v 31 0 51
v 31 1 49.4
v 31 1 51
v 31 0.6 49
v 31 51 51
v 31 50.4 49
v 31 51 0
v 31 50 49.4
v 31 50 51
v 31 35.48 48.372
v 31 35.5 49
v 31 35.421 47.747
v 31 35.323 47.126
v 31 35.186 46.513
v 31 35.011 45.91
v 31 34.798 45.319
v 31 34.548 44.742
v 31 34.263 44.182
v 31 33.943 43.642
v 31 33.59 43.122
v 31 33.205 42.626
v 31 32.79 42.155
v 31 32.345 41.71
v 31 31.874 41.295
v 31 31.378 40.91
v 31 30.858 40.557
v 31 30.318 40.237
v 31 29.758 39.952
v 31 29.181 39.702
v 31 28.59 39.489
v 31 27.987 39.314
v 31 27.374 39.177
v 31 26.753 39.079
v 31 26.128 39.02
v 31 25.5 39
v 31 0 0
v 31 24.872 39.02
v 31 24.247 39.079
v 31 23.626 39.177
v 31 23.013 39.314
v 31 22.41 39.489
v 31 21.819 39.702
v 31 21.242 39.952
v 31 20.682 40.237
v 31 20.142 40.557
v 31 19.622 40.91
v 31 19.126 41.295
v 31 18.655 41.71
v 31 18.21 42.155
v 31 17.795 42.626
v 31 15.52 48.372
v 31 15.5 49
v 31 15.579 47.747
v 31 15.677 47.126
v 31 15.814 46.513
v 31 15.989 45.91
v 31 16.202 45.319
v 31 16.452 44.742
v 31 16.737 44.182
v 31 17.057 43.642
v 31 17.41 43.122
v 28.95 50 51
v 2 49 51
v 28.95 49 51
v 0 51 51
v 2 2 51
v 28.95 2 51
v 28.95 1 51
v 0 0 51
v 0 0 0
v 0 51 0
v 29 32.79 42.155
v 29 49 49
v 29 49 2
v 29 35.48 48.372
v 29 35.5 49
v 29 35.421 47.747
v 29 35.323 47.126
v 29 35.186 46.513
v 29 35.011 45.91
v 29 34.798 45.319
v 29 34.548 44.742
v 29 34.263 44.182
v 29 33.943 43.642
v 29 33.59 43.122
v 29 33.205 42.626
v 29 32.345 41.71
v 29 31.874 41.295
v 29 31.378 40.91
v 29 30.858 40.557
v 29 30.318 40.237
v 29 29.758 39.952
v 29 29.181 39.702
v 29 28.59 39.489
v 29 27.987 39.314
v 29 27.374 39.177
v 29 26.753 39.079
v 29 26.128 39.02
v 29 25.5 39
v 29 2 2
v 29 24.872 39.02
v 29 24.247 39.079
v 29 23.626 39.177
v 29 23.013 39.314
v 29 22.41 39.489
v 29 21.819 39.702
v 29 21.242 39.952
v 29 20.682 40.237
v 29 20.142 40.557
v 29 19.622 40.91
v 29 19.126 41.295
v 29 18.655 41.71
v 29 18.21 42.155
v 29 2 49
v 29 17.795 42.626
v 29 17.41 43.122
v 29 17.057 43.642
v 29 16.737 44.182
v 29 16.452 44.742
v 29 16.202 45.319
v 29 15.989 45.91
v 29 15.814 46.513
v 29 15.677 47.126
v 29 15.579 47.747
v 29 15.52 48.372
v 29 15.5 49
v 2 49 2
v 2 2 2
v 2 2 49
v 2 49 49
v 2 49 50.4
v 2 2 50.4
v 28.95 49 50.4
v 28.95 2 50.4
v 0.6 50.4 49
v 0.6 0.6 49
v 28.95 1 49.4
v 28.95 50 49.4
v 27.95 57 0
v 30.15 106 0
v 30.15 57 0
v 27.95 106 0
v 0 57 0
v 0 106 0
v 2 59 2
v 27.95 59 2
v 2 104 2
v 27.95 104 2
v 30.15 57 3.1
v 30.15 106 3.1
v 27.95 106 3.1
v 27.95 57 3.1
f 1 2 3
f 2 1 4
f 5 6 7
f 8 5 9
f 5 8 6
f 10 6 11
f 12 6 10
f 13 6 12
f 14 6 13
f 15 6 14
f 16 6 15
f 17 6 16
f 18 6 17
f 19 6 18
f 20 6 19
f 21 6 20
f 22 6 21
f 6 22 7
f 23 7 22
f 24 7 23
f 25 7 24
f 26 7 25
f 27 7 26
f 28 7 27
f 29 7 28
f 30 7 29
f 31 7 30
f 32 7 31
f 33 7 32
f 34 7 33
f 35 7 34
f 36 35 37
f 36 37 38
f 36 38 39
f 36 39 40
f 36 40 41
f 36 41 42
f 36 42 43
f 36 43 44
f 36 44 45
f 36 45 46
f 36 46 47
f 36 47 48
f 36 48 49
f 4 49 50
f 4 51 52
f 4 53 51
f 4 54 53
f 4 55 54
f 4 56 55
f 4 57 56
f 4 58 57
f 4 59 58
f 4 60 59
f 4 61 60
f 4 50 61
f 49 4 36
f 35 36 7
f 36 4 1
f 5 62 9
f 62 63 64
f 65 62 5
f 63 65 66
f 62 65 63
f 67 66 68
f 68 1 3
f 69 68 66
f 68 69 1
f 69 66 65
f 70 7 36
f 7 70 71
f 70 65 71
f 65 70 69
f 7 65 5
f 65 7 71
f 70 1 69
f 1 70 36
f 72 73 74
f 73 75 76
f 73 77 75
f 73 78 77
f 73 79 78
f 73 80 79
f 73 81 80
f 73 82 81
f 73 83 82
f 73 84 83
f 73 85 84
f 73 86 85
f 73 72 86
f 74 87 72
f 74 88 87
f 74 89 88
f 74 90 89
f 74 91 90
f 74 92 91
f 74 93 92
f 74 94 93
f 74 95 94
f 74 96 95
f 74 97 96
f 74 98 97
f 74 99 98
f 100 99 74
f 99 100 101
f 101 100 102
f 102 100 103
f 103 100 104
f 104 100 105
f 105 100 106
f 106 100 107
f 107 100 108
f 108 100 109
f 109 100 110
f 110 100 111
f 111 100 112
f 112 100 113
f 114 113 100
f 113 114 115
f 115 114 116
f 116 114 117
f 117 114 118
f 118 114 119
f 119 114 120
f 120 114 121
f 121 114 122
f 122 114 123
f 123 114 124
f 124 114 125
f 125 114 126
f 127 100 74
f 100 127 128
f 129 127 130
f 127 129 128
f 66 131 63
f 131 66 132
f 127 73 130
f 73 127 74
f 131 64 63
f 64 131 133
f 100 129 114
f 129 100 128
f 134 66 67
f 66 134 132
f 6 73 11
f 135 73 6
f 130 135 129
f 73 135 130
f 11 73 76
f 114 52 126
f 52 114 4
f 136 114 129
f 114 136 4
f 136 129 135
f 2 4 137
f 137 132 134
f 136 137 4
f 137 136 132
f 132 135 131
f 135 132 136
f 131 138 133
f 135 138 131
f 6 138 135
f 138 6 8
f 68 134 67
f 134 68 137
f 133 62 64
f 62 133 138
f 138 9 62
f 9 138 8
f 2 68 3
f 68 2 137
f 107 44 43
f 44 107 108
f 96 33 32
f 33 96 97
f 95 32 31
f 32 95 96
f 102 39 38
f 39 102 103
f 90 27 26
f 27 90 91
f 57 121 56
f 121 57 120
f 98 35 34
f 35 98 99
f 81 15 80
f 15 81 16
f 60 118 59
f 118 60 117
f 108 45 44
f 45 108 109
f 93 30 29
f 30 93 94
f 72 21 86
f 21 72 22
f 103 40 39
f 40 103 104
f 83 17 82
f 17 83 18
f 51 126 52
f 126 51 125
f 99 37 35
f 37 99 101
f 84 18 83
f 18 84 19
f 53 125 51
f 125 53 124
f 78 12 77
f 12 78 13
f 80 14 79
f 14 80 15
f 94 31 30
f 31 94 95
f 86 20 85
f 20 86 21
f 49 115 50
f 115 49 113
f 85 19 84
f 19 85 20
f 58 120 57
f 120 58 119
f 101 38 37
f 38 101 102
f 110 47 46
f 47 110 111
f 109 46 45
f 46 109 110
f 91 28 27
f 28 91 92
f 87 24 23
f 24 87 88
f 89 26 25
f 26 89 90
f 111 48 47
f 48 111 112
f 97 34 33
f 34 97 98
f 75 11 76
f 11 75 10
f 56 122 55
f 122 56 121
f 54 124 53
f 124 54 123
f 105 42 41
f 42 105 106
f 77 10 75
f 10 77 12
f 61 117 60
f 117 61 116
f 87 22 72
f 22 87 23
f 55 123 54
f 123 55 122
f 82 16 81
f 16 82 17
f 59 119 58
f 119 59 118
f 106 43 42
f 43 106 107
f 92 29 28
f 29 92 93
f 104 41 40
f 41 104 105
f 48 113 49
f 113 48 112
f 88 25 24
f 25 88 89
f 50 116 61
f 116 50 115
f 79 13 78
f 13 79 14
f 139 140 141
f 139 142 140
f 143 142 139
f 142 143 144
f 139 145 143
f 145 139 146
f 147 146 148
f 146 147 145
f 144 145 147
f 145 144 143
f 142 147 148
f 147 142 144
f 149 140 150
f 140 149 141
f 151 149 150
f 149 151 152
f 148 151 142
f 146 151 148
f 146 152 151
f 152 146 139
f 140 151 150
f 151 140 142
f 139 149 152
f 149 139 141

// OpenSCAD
// file: carcassonne_box.scad
/**
 * @file carcassonne_box.scad
 * @author Conlan Wesson (modified by [Your Name])
 * Template for Carcassonne boxes.
 * @copyright Creative Commons Attribution-NonCommercial-ShareAlike 4.0
 */

mm = 1;
cm = 10*mm;

tiles = 2*mm;
clearance = 3*mm;

width = 47*mm;
thick = 2.5*mm;
wall = 2*mm;

/**
 * Lid for box.
 * @param sections Array of section lengths.
 * @param columns Number of columns.
 * @param icon Path to icon DXF file.
 * @param rot Icon rotation in degrees.
 * @param mult Icon scale.
 * @param xoff X-offset of icon from center.
 * @param yoff Y-offset of icon from center.
 */
module carcassonne_lid(sections, columns=1, icon=false, icon2=false, icon3=false, rot=0, mult=1, xoff=0, yoff=0, mult2=1, xoff2=0, yoff2=0, mult3=1, xoff3=0, yoff3=0, g=0){
    divider_thickness = wall/2;
    length = sum(sections) + (divider_thickness * (len(sections) - 1));
    w = length+(1.5*wall)+.1;
    l = (width*columns)+wall;
    h = wall;
    d = 2;

    CubePoints = [
        [ 0-g, 0-g,   0 ],  //0
        [ w+g, 0-g,   0 ],  //1
        [ w+g, l+g,   0 ],  //2
        [ 0-g, l+g,   0 ],  //3
        [   d,   d, h+g ],  //4
        [   w,   d, h+g ],  //5
        [   w, l-d, h+g ],  //6
        [   d, l-d, h+g ]   //7
    ];

    CubeFaces = [
        [0,1,2,3],  // bottom
        [4,5,1,0],  // front
        [7,6,5,4],  // top
        [5,6,2,1],  // right
        [6,7,3,2],  // back
        [7,4,0,3]   // left
    ];

    difference(){
        union(){
            polyhedron( CubePoints, CubeFaces );
            translate([w-wall-.15,0,0]) cube([wall+.2,l, (1.5*wall)+.1]);
        }
        if(icon){
            translate([w/2+xoff,l/3+yoff,h-(wall/2)]){
                linear_extrude(height=(wall)+.1){
                    rotate(rot) scale(mult) import(icon);
                }
            }
        }
        if(icon2){
            translate([w/2+xoff2,l/3+yoff2,h-(wall/2)]){
                linear_extrude(height=(wall)+.1){
                    rotate(rot) scale(mult2) import(icon2);
                }
            }
        }
        if(icon3){
            translate([w/2+xoff3,l/3+yoff3,h-(wall/2)]){
                linear_extrude(height=(wall)+.1){
                    rotate(rot) scale(mult3) import(icon3);
                }
            }
        }
    }
}

/**
 * Carcassonne card box.
 * @param sections Array of section lengths.
 * @param columns Number of columns.
 */
module carcassonne_box(sections, columns=1){
    divider_thickness = wall/2;
    raw_length = sum(sections) + (divider_thickness * (len(sections) - 1));
    length = raw_length;

    section_count = len(sections);

    difference(){
        union(){
            difference(){
                // Outer walls
                cube([length+(2*wall), (width*columns)+(2*wall), width+(2*wall)]);
                // Cavity
                translate([wall, wall, wall]){
                    cube([length, width*columns, (width+wall)+.1]);
                }
            }
            // Dividers
            for(col = [0:columns-1]){
                divider_positions = [for(i=0; i<len(sections)-1; i=i+1) 
                    sum([for(j=[0:i]) sections[j]]) + (i * divider_thickness)];
                for(pos = divider_positions){
                    translate([pos+wall, width*col+wall, 0]) 
                        cube([divider_thickness, width, width-(2*wall)]);
                }
                if(col > 0){
                    translate([0, width*col+(wall/2), 0]) 
                        cube([length+(2*wall)-18.0, wall/2, width-(2*wall)]);
                }
            }
        }
        union(){
            // Notch
            for(col = [0:columns-1]){
                translate([wall, wall+(width*col), wall]){
                    translate([0, width/2, width])
                    rotate([0, 90, 0]){
                        cylinder(r=10, h=length+(2*wall), $fn=100);
                    }
                }
            }
            // Track
            translate([wall/2, wall/2, width+wall])
                carcassonne_lid(sections, columns, g=0.4);
        }
    }
}


// Helper function to sum an array
function sum(v, i = 0, r = 0) = i < len(v) ? sum(v, i + 1, r + v[i]) : r;
// main file
/**
 * @file signposts.scad
 * @author Andrew Hargrave
 * Signposts Carcossonne box.
 * @copyright Creative Commons Attribution-NonCommercial-ShareAlike 4.0
 */

include <carcassonne_box.scad>

sections = [(12 * tiles + clearance)];
columns = 1; 
icon="0-signposts.dxf";

carcassonne_box(sections, columns);
translate([0,width*columns+10,0]) carcassonne_lid(sections, columns, icon, rot=90, mult=2.2, xoff=21, yoff=-9); 
